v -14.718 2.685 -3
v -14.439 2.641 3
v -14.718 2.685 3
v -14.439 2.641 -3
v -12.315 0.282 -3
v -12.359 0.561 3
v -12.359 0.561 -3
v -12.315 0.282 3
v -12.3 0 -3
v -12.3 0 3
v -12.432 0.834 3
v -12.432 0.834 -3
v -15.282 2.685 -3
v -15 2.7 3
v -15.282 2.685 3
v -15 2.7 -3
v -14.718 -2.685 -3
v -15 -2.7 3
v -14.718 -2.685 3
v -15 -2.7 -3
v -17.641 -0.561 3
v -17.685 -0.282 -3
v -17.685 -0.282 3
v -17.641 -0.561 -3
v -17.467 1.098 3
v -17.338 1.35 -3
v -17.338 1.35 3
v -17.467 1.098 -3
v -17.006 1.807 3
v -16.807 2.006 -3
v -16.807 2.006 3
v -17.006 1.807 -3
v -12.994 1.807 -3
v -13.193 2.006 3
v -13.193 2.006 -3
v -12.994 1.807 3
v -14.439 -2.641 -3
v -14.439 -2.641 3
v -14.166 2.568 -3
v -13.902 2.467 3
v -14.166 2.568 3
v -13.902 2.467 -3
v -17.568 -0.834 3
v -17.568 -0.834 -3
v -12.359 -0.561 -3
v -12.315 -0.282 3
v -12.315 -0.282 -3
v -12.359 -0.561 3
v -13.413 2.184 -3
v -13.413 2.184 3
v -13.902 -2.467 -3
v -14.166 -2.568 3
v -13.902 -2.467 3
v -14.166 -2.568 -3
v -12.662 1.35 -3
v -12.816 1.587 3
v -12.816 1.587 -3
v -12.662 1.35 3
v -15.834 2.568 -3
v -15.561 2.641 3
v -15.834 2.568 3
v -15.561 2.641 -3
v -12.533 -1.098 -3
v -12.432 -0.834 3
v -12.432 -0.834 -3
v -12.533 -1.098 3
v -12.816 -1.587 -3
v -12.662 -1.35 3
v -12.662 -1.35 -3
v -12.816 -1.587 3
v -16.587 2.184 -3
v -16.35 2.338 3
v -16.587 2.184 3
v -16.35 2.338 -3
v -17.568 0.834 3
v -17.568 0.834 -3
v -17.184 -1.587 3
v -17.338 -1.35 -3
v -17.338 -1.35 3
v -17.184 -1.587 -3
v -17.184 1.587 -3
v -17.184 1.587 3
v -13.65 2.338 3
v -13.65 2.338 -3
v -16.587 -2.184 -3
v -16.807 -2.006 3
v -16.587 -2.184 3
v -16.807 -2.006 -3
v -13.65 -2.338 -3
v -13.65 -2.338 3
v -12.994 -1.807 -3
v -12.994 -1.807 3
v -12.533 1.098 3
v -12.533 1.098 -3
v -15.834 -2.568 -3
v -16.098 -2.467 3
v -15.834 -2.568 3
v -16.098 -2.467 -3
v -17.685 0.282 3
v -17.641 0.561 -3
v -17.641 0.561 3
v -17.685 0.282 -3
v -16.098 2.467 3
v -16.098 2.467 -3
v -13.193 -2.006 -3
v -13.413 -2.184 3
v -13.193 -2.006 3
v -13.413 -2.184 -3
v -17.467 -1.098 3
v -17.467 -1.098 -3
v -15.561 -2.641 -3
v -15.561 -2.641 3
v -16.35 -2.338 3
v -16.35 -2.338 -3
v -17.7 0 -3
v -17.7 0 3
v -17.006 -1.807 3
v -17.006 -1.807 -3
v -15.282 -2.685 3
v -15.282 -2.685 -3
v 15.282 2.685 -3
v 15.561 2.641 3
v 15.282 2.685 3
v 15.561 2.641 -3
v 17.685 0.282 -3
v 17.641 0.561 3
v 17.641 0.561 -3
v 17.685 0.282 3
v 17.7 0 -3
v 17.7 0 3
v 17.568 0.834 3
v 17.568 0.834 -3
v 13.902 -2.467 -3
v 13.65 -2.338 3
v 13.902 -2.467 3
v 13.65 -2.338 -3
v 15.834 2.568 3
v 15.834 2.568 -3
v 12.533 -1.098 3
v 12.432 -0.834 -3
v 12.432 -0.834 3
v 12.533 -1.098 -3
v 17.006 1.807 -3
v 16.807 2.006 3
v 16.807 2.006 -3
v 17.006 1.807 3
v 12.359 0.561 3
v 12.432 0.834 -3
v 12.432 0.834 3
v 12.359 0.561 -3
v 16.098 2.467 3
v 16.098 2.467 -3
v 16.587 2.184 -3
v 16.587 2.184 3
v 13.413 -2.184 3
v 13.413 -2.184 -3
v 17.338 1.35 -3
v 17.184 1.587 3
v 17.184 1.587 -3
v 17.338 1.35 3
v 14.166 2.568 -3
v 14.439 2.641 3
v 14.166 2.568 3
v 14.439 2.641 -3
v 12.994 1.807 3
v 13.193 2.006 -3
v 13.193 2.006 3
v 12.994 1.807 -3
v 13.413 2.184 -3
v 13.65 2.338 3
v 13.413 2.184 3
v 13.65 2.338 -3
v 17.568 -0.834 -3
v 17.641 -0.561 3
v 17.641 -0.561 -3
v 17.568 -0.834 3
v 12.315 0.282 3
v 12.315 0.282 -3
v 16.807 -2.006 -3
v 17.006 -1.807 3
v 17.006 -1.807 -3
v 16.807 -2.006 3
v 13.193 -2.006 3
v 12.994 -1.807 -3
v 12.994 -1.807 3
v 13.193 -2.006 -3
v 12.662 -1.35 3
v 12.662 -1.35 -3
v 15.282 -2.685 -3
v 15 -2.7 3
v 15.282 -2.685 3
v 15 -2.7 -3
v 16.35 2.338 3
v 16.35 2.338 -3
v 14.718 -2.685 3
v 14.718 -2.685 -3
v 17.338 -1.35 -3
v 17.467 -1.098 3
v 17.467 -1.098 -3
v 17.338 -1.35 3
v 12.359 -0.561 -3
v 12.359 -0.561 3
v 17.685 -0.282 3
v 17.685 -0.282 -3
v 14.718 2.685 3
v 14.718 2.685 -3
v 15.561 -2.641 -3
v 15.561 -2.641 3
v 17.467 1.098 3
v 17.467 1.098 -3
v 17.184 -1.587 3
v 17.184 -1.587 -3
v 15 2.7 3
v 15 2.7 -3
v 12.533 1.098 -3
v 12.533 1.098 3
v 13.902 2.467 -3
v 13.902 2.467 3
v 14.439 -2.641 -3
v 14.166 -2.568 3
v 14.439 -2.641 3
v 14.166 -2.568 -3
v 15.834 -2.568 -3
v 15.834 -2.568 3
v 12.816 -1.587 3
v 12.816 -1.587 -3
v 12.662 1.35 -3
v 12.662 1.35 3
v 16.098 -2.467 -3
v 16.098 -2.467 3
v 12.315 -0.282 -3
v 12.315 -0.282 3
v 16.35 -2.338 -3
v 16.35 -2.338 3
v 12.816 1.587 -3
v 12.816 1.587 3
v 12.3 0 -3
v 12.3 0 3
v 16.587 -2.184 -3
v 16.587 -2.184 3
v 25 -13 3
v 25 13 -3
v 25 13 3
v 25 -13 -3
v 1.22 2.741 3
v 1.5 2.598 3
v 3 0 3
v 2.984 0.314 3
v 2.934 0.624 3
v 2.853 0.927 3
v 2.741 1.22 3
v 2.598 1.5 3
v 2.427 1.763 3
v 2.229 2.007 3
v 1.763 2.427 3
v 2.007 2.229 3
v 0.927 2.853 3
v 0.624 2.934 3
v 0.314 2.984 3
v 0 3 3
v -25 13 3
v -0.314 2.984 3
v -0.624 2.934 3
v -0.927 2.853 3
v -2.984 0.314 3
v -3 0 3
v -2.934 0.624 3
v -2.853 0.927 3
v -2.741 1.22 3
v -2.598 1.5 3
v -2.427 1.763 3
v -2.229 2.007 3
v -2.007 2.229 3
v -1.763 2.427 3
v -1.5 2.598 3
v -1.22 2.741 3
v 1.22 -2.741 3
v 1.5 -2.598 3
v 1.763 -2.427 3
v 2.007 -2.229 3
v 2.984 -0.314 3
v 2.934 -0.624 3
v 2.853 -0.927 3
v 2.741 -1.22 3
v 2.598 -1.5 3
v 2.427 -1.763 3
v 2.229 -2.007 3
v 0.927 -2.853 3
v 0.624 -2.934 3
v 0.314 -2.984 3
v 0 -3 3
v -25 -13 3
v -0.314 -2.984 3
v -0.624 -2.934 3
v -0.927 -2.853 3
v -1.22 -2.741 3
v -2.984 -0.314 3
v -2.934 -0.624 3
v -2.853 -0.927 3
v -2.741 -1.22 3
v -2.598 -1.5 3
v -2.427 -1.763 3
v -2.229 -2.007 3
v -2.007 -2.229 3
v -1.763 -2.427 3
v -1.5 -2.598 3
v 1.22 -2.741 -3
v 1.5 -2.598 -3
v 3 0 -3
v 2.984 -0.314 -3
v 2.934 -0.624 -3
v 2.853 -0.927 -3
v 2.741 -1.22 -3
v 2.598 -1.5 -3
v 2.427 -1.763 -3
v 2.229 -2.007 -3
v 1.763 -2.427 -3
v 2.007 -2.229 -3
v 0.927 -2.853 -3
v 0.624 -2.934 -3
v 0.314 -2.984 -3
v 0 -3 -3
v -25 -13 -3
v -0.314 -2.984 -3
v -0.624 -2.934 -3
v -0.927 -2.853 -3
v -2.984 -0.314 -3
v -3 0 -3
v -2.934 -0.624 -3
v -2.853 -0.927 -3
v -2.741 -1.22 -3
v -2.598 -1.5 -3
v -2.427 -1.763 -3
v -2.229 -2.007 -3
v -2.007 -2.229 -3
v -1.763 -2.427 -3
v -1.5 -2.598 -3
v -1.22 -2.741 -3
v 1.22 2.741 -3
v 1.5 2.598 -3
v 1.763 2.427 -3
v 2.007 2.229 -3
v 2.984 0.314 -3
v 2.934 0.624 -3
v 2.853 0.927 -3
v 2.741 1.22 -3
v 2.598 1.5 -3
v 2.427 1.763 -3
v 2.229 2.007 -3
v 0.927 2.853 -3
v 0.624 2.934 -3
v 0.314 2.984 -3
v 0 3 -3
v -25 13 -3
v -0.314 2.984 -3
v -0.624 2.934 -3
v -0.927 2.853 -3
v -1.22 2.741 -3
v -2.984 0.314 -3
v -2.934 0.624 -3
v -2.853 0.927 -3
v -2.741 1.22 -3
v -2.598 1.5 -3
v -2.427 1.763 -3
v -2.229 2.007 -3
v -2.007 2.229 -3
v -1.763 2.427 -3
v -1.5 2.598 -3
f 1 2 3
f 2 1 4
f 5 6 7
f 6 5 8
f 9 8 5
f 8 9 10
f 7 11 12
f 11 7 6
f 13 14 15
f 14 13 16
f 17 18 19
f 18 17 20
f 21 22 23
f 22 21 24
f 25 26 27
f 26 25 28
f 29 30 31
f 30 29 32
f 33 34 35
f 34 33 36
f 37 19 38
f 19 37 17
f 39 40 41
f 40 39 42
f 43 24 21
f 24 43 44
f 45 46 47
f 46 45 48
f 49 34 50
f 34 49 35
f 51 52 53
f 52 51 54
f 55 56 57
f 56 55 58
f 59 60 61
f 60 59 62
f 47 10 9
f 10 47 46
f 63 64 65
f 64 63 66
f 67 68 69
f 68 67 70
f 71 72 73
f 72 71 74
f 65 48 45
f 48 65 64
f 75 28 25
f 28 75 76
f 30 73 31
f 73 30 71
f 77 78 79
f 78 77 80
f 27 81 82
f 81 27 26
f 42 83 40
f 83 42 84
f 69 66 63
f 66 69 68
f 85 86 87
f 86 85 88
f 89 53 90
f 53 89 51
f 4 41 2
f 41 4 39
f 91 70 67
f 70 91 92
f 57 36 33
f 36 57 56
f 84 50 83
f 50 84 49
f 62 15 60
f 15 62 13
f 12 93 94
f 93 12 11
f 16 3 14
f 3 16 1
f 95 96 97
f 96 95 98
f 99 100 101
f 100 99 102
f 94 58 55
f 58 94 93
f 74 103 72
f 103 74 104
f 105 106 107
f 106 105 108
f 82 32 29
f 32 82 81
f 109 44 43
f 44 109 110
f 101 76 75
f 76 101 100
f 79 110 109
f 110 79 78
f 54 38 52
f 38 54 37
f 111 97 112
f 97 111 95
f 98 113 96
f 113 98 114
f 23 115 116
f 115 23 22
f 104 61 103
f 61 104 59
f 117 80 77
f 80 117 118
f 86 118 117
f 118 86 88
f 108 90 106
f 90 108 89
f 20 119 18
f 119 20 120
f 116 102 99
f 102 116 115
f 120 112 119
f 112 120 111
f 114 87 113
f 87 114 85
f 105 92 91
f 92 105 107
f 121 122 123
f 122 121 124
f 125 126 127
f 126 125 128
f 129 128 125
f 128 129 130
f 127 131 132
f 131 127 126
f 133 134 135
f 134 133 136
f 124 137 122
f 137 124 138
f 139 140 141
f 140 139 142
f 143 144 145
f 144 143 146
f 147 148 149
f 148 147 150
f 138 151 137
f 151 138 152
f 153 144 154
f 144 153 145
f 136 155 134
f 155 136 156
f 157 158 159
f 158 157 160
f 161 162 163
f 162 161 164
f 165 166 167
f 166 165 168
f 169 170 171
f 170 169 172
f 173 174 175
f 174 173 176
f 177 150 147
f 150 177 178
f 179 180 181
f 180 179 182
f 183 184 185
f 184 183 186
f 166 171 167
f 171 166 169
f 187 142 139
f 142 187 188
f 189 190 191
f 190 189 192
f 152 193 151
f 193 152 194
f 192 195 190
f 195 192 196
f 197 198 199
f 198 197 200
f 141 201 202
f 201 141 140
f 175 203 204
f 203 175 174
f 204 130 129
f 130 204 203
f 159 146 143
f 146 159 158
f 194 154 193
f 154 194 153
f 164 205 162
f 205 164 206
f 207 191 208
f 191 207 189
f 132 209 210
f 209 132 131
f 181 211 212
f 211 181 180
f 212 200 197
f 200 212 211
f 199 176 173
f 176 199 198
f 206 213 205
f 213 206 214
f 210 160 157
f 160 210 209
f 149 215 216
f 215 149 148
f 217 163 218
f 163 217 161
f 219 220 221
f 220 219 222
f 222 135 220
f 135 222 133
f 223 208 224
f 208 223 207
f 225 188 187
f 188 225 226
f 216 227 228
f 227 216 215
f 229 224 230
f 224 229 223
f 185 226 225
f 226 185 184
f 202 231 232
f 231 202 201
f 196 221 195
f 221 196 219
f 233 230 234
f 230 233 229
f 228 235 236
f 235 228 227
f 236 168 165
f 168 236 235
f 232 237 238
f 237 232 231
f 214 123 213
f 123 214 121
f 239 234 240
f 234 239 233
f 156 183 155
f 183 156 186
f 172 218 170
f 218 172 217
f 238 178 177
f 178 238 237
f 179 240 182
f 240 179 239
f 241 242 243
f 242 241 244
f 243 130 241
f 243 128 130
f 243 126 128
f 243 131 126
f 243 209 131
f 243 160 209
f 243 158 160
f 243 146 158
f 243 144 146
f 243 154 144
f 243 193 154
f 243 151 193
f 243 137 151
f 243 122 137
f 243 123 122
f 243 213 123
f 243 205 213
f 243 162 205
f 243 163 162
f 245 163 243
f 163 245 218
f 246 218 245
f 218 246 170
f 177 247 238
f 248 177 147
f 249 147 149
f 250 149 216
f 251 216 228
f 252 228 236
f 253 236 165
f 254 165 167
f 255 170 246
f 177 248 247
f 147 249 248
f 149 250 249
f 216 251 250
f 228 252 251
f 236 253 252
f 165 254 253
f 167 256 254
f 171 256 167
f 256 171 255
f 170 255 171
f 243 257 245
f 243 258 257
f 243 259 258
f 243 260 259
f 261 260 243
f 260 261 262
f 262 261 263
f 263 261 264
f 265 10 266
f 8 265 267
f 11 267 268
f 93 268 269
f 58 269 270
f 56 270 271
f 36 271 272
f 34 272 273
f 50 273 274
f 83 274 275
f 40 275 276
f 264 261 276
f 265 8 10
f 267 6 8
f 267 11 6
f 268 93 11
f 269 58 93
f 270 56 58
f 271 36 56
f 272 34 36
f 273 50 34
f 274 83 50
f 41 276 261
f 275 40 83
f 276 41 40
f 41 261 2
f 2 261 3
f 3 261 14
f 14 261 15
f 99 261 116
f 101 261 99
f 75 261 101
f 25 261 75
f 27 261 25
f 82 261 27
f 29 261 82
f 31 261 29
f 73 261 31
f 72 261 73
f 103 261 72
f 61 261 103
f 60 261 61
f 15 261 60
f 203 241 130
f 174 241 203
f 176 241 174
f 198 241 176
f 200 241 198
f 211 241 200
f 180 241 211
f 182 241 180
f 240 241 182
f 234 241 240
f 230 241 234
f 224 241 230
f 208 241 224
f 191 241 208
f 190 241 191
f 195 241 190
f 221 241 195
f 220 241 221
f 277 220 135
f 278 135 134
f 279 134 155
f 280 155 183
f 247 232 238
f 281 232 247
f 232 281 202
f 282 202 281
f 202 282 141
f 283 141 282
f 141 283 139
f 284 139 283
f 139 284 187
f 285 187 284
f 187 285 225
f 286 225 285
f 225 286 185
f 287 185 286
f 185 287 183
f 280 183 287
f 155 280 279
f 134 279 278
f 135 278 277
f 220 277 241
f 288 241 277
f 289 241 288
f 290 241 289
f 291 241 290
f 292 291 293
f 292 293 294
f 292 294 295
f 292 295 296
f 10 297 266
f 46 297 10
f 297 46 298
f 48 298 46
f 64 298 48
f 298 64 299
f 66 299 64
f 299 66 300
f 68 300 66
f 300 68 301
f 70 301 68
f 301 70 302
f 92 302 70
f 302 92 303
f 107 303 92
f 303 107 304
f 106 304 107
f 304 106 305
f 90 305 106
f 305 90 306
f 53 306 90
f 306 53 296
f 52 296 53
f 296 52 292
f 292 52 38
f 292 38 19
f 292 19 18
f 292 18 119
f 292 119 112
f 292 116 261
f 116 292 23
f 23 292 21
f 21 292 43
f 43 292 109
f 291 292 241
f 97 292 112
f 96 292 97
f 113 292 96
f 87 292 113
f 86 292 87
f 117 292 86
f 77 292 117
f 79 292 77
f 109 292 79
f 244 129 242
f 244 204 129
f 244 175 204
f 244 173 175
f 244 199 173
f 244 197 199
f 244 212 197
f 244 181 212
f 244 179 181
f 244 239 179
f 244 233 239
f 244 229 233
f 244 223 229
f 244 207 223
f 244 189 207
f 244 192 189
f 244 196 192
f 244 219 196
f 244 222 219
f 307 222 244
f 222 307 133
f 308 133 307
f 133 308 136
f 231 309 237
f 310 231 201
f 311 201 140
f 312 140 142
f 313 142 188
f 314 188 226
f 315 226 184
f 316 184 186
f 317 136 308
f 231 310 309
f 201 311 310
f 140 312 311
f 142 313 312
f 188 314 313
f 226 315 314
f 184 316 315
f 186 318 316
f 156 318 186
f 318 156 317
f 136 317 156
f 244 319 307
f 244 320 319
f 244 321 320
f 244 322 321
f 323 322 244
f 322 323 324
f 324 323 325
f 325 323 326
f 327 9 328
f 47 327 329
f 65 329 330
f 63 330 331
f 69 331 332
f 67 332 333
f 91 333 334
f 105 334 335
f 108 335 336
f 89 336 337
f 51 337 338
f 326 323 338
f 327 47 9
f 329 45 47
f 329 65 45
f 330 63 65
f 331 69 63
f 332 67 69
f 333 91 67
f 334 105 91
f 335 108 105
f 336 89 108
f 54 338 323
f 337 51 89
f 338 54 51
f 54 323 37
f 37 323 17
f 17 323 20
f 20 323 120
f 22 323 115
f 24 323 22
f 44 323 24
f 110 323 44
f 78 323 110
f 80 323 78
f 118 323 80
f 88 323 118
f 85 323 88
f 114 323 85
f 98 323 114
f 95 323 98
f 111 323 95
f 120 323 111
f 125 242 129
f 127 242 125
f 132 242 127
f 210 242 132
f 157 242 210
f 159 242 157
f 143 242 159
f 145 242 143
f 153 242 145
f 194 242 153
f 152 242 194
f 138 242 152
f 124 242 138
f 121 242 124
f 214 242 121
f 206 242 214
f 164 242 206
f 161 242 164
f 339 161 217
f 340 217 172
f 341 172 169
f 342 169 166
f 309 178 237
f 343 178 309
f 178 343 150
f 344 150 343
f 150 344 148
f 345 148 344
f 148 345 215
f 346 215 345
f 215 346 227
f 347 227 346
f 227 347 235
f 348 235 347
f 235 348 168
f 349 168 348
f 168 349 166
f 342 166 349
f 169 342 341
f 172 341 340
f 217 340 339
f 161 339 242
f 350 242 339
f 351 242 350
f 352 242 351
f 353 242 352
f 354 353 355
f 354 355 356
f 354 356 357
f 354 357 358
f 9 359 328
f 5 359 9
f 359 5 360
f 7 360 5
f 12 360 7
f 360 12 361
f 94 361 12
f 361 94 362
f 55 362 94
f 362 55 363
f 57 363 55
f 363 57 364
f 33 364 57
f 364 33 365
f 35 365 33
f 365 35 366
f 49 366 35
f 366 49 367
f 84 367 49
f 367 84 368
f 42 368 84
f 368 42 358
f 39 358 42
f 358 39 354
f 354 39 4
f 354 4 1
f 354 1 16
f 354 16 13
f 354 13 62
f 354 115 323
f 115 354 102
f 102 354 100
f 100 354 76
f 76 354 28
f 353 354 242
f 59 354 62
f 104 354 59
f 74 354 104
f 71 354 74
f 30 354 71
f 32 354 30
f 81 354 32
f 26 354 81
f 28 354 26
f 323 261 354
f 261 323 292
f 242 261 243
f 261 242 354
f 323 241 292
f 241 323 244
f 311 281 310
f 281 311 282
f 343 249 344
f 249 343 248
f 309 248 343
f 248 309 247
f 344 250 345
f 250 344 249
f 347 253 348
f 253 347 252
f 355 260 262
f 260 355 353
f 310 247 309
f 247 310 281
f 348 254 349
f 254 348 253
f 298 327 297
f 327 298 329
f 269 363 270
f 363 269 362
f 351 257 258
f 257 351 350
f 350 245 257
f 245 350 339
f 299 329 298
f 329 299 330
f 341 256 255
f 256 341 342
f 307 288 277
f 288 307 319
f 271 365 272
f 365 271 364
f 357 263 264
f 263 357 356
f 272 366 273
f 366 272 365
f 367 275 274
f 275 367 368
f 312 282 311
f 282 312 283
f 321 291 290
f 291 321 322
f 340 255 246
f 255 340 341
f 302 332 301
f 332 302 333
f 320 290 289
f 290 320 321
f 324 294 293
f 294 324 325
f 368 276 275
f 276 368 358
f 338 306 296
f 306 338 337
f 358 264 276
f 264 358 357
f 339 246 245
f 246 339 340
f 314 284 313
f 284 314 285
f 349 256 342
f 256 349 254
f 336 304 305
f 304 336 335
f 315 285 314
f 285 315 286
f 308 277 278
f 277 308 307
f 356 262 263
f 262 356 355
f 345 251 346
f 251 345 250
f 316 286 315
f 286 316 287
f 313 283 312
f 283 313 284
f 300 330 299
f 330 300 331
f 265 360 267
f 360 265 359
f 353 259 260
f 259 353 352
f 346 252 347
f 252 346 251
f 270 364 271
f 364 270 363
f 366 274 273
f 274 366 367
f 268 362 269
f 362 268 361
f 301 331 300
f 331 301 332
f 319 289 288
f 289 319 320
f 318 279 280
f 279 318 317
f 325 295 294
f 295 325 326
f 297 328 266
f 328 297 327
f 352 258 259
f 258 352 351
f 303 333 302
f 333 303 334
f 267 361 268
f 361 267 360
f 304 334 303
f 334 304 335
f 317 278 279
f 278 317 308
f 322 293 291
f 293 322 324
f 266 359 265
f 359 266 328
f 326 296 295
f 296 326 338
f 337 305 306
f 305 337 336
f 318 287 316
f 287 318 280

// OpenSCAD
// Rod-end mounting plate.
$fn = 60;
eps = 0.02;
plate_l = 50;
plate_w = 26;
plate_t = 6;
bore_d = 6;
difference() {
    cube([plate_l, plate_w, plate_t], center = true);
    translate([0, 0, -plate_t / 2 - eps]) cylinder(d = bore_d, h = plate_t + 2 * eps);
    for (x = [-plate_l / 2 + 10, plate_l / 2 - 10])
        translate([x, 0, -plate_t / 2 - eps]) cylinder(d = 5.4, h = plate_t + 2 * eps);
}
